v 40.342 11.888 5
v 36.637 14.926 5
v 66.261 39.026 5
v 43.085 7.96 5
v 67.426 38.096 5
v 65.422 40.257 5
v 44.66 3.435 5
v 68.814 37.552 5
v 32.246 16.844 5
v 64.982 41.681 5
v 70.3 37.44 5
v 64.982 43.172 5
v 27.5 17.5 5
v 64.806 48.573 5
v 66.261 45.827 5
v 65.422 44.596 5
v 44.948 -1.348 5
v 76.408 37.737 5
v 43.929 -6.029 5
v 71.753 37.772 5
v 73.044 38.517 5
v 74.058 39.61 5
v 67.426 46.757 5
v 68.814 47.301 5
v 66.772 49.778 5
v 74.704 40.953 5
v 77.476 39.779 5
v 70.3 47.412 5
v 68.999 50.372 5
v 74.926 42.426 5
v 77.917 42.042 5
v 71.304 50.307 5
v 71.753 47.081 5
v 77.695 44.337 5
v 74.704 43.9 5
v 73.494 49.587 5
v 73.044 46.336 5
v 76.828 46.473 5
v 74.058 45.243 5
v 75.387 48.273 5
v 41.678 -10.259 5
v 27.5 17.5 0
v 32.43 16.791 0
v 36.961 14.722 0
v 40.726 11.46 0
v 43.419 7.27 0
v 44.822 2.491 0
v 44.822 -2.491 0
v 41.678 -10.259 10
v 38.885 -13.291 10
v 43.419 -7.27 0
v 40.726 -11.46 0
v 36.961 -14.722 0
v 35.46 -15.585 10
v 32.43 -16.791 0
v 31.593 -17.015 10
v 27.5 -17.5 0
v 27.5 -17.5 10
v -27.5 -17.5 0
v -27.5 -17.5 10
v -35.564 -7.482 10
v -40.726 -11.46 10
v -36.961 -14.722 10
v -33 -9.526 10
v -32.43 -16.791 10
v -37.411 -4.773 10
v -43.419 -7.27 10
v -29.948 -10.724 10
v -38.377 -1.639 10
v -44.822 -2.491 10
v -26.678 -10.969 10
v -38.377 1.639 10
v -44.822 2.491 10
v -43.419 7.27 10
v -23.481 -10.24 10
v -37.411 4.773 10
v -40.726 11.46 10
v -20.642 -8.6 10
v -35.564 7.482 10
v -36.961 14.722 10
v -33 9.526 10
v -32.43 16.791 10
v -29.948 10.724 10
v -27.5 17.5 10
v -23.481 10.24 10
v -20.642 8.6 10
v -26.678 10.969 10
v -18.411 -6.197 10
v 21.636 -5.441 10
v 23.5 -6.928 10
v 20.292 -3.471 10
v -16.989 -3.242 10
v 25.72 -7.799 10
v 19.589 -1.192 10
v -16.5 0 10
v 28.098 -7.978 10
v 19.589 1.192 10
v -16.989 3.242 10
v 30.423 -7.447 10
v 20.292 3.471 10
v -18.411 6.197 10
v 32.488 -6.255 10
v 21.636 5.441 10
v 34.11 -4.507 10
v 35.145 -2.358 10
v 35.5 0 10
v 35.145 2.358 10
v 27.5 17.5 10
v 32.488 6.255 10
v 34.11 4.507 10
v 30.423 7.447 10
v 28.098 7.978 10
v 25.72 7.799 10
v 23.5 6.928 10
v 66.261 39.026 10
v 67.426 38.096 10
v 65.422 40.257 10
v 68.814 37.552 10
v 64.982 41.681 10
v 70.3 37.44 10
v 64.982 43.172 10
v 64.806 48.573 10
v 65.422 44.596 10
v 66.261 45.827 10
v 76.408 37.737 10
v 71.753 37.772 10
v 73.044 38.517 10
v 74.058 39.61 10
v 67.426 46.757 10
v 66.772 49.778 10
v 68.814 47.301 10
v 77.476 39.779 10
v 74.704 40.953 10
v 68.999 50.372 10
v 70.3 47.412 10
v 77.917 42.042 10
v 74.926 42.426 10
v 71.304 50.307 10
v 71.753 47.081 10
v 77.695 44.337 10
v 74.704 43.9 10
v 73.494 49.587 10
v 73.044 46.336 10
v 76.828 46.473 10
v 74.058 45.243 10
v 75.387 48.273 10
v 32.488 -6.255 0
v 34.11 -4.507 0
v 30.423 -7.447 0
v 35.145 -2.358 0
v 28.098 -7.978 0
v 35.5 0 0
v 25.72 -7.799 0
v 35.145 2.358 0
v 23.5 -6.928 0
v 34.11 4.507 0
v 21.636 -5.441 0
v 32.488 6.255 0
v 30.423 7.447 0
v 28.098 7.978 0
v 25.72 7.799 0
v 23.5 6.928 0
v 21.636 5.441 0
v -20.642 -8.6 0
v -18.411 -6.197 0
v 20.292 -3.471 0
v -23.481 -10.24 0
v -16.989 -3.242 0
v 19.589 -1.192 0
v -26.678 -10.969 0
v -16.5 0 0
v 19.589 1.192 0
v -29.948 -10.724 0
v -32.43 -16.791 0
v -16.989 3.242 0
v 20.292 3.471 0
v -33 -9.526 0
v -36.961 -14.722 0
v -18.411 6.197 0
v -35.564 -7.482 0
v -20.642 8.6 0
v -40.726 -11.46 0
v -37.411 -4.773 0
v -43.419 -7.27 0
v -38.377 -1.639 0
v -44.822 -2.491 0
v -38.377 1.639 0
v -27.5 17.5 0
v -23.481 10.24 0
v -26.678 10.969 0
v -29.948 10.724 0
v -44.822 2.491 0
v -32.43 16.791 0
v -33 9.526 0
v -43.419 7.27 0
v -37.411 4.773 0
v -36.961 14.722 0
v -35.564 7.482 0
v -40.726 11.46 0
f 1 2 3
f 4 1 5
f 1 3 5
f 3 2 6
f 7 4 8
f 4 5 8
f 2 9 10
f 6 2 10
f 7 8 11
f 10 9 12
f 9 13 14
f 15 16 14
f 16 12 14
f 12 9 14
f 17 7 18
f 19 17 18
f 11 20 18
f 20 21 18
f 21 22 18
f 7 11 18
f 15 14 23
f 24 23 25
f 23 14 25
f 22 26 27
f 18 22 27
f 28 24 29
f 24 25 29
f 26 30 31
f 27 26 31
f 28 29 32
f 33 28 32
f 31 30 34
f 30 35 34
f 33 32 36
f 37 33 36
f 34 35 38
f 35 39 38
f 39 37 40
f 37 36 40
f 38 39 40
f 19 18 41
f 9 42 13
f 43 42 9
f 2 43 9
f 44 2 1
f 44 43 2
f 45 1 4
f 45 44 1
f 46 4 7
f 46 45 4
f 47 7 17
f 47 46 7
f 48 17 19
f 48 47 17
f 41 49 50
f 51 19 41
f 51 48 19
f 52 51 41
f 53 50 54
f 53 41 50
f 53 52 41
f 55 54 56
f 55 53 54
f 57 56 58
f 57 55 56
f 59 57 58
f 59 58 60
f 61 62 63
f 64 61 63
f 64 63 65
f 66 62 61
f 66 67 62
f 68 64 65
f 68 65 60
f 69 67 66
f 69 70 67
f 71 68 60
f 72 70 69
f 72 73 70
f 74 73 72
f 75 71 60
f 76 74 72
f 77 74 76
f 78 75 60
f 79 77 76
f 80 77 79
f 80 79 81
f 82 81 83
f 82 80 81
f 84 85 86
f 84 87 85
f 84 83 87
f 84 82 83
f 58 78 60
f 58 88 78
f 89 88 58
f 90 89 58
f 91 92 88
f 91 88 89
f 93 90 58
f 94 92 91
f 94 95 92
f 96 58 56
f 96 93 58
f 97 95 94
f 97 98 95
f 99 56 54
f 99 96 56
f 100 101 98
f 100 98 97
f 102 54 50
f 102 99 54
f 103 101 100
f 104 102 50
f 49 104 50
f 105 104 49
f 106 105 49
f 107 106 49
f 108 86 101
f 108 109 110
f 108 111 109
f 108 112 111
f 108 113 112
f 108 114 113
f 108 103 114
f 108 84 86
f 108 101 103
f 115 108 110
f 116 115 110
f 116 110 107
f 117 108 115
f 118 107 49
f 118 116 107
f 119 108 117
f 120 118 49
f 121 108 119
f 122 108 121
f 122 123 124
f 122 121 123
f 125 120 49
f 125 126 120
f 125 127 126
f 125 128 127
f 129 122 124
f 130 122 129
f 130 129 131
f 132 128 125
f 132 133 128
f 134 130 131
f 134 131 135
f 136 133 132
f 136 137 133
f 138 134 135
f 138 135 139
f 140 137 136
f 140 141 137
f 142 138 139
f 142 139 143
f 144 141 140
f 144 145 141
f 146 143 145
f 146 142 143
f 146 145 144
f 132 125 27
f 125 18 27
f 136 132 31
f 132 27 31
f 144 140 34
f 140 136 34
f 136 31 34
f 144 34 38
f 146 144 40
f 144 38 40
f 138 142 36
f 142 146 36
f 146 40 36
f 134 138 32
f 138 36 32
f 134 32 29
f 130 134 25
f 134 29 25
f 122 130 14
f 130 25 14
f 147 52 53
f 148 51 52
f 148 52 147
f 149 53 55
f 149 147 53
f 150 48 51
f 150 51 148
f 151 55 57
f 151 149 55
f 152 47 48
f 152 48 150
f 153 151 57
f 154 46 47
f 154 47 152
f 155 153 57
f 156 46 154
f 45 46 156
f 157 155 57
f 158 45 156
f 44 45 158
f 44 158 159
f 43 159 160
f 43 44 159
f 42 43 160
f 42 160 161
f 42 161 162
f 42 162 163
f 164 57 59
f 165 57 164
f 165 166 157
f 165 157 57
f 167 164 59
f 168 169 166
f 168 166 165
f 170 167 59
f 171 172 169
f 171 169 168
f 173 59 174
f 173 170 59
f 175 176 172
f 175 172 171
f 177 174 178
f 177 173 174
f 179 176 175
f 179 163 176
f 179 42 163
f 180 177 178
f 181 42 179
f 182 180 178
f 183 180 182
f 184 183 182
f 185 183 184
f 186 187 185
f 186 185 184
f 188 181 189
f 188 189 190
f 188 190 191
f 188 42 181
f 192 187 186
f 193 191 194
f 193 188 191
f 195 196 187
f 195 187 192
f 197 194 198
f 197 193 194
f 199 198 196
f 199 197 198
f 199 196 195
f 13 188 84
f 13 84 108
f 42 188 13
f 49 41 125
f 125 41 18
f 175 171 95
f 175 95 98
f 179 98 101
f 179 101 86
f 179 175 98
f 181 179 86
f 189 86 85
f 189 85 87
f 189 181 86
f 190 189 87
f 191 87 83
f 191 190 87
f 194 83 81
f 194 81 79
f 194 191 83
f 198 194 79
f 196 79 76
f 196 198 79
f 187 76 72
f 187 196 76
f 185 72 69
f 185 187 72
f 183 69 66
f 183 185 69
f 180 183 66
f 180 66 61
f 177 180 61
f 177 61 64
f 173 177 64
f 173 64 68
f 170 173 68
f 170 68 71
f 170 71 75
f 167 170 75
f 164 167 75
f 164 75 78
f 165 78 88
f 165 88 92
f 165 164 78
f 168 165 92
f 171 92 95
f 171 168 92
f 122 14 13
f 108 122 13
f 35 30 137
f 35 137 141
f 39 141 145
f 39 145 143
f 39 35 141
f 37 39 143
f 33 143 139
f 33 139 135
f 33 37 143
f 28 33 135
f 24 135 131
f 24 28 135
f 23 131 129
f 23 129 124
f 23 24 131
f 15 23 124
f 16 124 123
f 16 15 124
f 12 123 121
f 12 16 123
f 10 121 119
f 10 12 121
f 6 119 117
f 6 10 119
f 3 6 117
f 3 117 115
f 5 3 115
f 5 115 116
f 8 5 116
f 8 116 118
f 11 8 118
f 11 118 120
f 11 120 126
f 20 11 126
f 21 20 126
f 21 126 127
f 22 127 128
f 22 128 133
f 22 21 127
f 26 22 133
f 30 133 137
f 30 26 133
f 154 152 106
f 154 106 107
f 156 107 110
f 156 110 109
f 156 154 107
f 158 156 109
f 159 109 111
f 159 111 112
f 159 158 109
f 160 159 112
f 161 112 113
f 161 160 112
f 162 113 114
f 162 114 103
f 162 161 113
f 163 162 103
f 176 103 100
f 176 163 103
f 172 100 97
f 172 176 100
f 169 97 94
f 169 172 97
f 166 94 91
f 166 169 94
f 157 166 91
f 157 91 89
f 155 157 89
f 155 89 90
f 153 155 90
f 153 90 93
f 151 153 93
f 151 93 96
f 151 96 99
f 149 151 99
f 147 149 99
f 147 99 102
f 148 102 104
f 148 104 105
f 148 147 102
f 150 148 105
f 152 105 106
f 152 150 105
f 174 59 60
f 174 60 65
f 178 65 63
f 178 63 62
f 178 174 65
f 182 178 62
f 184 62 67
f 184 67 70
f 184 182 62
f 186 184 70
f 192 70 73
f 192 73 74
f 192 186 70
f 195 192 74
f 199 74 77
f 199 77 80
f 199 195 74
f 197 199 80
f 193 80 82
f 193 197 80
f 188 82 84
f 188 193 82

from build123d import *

# Parameters (mm, degrees)
SKETCH_1_R      = 11
SKETCH_1_R_2    = 8
EXTRUDE_1_DEPTH = 10
EXTRUDE_START   = -5
SKETCH_2_R      = 8
SKETCH_2_R_2    = 5
EXTRUDE_2_DEPTH = 5


with BuildPart() as part:
    # Эскиз1 → Бобышка-Вытянуть1 (new body)
    with BuildSketch(Plane.XY):
        with BuildLine():
            Line((-27.5, 17.5), (27.5, 17.5))
            ThreePointArc((27.5, 17.5), (45, 0), (27.5, -17.5))
            Line((27.5, -17.5), (-27.5, -17.5))
            ThreePointArc((-27.5, -17.5), (-45, 0), (-27.5, 17.5))
        make_face()
        with Locations((-27.5, 0)):
            Circle(SKETCH_1_R, mode=Mode.SUBTRACT)
        with Locations((27.5, 0)):
            Circle(SKETCH_1_R_2, mode=Mode.SUBTRACT)
    extrude(amount=EXTRUDE_1_DEPTH)

    # Эскиз2 → Бобышка-Вытянуть2 (add)
    # profile 1 of 2: a face of its own
    with BuildSketch(Plane.XY.offset(10).offset(EXTRUDE_START)):
        with BuildLine():
            ThreePointArc((27.5, 17.5), (43.084968678, 7.959821059), (41.677549931, -10.258999852))
            Line((41.677549931, -10.258999852), (76.407572554, 37.736578368))
            ThreePointArc((76.407572554, 37.736578368), (64.46541326, 36.580250119), (64.806416341, 48.573414027))
            Line((64.806416341, 48.573414027), (27.5, 17.5))
        make_face()
    # profile 2 of 2: a face of its own
    with BuildSketch(Plane.XY.offset(10).offset(EXTRUDE_START)):
        with Locations((69.926406871, 42.426406871)):
            Circle(SKETCH_2_R)
        with Locations((69.926406871, 42.426406871)):
            Circle(SKETCH_2_R_2, mode=Mode.SUBTRACT)
    extrude(amount=EXTRUDE_2_DEPTH)


solid = part.part
